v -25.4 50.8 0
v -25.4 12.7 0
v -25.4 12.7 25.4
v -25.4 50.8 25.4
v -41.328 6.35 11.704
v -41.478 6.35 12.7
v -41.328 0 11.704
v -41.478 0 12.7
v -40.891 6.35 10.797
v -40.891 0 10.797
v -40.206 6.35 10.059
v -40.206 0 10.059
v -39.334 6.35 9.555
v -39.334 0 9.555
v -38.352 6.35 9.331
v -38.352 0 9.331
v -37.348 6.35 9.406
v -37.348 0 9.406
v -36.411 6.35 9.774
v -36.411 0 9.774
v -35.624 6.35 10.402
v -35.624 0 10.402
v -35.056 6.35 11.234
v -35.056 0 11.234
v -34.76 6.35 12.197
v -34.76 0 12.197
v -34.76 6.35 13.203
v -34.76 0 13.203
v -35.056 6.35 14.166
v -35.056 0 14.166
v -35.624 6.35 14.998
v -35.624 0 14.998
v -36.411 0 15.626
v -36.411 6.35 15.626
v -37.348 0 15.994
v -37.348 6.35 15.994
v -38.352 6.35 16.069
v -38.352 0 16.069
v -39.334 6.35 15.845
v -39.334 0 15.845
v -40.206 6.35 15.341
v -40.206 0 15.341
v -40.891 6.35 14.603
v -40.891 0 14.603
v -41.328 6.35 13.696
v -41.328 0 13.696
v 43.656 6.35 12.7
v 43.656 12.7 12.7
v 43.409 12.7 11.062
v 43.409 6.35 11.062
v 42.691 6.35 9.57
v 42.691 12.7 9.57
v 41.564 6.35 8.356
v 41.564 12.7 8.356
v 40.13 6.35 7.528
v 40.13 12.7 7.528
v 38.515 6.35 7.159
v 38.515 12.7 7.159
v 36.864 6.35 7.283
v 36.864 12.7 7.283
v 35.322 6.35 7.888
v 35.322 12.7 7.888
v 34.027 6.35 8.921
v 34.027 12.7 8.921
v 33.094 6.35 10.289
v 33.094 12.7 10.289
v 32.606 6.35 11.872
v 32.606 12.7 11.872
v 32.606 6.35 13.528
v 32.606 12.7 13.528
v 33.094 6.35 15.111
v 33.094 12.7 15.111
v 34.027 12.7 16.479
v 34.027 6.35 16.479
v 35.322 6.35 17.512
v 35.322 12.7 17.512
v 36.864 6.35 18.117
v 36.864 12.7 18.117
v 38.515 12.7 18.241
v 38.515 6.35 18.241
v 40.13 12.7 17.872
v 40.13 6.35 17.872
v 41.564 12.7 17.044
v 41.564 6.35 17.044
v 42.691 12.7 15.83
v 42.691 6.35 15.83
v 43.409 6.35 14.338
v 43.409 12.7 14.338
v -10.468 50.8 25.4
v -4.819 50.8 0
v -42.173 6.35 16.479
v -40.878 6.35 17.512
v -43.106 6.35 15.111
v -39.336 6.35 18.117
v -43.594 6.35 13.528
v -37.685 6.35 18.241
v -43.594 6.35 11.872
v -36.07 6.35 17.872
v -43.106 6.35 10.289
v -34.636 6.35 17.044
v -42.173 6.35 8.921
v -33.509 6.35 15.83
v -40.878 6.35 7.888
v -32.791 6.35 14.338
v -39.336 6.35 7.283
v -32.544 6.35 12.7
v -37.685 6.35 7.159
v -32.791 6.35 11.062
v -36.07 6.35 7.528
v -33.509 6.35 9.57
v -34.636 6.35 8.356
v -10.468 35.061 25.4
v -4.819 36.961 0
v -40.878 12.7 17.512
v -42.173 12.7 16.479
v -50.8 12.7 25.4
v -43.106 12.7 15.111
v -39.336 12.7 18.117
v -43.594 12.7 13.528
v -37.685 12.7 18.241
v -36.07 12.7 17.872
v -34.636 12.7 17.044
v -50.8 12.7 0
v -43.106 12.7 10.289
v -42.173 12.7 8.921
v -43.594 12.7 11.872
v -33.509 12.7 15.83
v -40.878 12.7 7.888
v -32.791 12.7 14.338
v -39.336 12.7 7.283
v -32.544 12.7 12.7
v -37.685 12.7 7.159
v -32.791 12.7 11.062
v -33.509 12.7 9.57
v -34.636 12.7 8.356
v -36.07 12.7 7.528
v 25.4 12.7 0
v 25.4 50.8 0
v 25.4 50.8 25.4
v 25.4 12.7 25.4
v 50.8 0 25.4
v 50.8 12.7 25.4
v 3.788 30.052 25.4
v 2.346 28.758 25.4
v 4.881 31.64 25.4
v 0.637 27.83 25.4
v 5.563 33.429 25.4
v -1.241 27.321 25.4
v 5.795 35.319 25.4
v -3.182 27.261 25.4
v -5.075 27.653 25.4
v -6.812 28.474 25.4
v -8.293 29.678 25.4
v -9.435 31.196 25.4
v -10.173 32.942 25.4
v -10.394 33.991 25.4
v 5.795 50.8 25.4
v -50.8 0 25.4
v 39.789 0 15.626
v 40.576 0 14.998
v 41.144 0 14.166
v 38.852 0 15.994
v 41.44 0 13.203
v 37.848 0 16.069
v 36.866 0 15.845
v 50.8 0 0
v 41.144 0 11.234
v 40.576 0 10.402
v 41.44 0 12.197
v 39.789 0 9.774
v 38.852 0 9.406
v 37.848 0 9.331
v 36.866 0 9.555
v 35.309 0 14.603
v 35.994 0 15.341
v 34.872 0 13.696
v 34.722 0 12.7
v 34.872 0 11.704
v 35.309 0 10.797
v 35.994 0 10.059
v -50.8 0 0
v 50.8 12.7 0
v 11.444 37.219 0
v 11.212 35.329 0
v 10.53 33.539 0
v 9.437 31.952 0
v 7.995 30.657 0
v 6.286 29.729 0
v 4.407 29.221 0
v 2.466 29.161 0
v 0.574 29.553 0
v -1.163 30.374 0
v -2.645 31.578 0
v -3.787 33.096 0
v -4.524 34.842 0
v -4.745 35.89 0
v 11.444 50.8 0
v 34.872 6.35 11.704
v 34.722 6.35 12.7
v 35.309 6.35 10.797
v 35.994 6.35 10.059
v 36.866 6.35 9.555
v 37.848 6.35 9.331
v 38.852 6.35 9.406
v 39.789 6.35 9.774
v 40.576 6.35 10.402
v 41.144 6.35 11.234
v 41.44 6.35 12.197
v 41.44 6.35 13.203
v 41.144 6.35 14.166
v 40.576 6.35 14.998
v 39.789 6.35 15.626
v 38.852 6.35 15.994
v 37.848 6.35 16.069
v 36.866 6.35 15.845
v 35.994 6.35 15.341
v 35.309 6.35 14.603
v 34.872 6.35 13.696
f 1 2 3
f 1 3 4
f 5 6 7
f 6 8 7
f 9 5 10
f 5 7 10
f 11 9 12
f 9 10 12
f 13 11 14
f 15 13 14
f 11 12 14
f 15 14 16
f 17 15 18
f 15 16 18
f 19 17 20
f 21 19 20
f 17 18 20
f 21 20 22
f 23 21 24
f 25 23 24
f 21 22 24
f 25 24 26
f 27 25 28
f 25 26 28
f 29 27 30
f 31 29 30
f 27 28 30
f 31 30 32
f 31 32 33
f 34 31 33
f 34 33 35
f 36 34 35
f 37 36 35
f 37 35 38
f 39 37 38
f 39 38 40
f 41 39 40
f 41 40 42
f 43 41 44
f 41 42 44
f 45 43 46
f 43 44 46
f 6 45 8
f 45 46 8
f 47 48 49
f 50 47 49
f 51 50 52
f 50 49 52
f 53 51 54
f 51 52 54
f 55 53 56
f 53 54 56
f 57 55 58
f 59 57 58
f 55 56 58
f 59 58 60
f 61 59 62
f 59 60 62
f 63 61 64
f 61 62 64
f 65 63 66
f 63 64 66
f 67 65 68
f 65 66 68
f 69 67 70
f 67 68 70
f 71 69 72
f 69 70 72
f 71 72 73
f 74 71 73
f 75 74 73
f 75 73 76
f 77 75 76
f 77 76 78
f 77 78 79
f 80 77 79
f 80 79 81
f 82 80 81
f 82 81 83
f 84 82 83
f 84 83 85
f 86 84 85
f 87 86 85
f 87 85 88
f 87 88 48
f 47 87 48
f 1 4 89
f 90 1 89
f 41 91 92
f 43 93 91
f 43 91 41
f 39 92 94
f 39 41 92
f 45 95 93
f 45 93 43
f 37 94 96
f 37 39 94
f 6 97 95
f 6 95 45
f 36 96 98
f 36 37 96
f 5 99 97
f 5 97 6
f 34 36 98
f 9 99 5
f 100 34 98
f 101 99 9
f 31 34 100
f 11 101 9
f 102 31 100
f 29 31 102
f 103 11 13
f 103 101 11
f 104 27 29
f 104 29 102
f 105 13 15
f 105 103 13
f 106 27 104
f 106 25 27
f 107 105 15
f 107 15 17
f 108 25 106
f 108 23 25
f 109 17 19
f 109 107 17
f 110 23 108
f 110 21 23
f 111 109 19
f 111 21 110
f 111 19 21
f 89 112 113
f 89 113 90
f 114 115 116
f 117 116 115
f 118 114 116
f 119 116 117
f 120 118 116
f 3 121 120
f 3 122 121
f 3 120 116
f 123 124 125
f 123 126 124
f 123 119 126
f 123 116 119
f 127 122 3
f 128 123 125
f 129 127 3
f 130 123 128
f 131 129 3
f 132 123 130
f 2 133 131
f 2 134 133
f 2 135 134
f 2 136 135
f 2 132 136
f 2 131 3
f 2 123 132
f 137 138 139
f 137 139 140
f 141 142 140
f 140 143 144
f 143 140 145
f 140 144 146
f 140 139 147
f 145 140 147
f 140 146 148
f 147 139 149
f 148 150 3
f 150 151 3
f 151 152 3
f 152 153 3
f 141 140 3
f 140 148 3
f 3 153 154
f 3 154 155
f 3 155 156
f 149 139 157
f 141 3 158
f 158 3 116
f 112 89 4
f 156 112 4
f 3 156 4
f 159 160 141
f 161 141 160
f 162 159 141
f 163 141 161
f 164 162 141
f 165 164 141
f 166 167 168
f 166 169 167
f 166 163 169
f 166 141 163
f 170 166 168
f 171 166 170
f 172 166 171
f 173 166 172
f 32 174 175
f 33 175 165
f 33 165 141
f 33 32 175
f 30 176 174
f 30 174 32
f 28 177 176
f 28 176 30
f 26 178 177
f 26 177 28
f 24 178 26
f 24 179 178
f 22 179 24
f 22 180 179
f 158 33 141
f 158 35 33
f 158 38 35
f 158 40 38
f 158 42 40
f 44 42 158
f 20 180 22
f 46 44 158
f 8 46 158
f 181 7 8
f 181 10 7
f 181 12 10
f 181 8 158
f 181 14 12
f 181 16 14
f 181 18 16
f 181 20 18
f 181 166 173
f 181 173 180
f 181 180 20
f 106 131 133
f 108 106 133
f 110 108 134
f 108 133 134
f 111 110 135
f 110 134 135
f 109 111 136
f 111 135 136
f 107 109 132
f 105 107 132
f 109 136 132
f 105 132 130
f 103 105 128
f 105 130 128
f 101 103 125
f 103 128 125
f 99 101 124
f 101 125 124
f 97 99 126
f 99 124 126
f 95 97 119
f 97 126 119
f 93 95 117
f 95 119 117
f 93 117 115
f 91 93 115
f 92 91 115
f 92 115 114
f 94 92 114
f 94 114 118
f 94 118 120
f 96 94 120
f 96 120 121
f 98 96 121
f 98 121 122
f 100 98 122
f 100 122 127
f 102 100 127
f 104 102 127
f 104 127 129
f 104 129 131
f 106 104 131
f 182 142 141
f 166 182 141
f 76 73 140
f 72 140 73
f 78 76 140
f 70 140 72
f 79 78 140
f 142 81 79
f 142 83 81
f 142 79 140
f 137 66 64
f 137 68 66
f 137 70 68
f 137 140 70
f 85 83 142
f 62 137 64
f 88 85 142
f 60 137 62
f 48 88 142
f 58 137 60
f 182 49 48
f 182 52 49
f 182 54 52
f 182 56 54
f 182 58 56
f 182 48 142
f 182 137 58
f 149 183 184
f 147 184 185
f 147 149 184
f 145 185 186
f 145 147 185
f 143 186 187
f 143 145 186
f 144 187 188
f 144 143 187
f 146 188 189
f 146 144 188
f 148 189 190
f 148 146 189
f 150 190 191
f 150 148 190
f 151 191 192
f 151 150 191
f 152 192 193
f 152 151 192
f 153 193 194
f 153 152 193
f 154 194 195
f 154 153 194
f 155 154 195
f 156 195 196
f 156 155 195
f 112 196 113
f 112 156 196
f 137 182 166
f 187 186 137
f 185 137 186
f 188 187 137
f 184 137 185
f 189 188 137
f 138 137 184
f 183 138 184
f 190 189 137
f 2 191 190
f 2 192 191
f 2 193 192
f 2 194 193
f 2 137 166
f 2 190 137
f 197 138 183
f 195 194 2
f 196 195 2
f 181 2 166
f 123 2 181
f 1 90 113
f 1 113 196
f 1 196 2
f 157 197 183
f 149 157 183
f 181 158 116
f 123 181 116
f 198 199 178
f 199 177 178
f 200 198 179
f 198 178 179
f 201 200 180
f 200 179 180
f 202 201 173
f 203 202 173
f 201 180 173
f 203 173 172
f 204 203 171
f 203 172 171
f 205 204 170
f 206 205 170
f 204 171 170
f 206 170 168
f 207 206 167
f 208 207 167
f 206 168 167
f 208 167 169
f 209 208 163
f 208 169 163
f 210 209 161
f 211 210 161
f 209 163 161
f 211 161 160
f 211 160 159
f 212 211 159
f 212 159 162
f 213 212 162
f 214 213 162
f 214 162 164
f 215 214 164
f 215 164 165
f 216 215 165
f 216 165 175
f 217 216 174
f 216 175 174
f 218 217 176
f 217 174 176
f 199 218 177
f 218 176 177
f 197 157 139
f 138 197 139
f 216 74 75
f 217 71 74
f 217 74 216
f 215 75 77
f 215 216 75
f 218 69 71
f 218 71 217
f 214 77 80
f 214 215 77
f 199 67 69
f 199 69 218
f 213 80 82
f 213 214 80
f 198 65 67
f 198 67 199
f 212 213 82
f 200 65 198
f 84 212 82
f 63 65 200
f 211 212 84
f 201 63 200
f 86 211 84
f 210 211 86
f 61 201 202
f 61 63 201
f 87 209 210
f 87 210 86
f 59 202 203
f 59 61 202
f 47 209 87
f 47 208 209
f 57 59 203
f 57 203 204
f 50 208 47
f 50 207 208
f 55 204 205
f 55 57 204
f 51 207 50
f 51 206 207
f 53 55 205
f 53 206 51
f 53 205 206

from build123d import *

# Parameters (mm, degrees)
BOSS_EXTRUDE1_DEPTH                              = 25.4
CBORE_FOR_1_4_SOCKET_HEAD_CAP_SCREW1_D           = 6.7564
CBORE_FOR_1_4_SOCKET_HEAD_CAP_SCREW1_CBORE_D     = 11.1125
CBORE_FOR_1_4_SOCKET_HEAD_CAP_SCREW1_CBORE_DEPTH = 6.35
SKETCH6_R                                        = 7.9375
CUT_EXTRUDE2_DEPTH                               = 93.898049386


with BuildPart() as part:
    # Sketch1 → Boss-Extrude1 (new body)
    with BuildSketch(Plane.XY):
        Polygon((25.4, 12.7), (50.8, 12.7), (50.8, 0), (-50.8, 0), (-50.8, 12.7), (-25.4, 12.7), (-25.4, 50.8), (25.4, 50.8), align=None)
    extrude(amount=BOSS_EXTRUDE1_DEPTH)

    # CBORE for 1/4 Socket Head Cap Screw1 (through all)
    with Locations(Plane(origin=(0, 12.7, 0), x_dir=(1, 0, 0), z_dir=(0, 1, 0))):
        with Locations((-38.1, -12.7), (38.1, -12.7)):
            CounterBoreHole(CBORE_FOR_1_4_SOCKET_HEAD_CAP_SCREW1_D / 2, CBORE_FOR_1_4_SOCKET_HEAD_CAP_SCREW1_CBORE_D / 2, CBORE_FOR_1_4_SOCKET_HEAD_CAP_SCREW1_CBORE_DEPTH)

    # Sketch6 → Cut-Extrude2 (cut, through all)
    with BuildSketch(Plane(origin=(-10.442463605, 32.464422505, 61.850379973), x_dir=(-0.9762276715802475, 0.026604535934103283, -0.21510865140374857), z_dir=(0.21650558359918726, 0.07280416213947143, -0.9735629852482811))):
        Circle(SKETCH6_R)
        with BuildLine():
            Line((-6.795136978, 42.915355356), (-7.934675442, 0.211735396))
            ThreePointArc((-7.934675442, 0.211735396), (0.105877117, 7.936793829), (7.9375, 0))
            ThreePointArc((7.9375, 0), (7.936793829, -0.105877117), (7.934675442, -0.211735396))
            Line((7.934675442, -0.211735396), (9.074213906, 42.491884564))
            Line((9.074213906, 42.491884564), (-6.795136978, 42.915355356))
        make_face()
    extrude(amount=CUT_EXTRUDE2_DEPTH, mode=Mode.SUBTRACT)


solid = part.part
